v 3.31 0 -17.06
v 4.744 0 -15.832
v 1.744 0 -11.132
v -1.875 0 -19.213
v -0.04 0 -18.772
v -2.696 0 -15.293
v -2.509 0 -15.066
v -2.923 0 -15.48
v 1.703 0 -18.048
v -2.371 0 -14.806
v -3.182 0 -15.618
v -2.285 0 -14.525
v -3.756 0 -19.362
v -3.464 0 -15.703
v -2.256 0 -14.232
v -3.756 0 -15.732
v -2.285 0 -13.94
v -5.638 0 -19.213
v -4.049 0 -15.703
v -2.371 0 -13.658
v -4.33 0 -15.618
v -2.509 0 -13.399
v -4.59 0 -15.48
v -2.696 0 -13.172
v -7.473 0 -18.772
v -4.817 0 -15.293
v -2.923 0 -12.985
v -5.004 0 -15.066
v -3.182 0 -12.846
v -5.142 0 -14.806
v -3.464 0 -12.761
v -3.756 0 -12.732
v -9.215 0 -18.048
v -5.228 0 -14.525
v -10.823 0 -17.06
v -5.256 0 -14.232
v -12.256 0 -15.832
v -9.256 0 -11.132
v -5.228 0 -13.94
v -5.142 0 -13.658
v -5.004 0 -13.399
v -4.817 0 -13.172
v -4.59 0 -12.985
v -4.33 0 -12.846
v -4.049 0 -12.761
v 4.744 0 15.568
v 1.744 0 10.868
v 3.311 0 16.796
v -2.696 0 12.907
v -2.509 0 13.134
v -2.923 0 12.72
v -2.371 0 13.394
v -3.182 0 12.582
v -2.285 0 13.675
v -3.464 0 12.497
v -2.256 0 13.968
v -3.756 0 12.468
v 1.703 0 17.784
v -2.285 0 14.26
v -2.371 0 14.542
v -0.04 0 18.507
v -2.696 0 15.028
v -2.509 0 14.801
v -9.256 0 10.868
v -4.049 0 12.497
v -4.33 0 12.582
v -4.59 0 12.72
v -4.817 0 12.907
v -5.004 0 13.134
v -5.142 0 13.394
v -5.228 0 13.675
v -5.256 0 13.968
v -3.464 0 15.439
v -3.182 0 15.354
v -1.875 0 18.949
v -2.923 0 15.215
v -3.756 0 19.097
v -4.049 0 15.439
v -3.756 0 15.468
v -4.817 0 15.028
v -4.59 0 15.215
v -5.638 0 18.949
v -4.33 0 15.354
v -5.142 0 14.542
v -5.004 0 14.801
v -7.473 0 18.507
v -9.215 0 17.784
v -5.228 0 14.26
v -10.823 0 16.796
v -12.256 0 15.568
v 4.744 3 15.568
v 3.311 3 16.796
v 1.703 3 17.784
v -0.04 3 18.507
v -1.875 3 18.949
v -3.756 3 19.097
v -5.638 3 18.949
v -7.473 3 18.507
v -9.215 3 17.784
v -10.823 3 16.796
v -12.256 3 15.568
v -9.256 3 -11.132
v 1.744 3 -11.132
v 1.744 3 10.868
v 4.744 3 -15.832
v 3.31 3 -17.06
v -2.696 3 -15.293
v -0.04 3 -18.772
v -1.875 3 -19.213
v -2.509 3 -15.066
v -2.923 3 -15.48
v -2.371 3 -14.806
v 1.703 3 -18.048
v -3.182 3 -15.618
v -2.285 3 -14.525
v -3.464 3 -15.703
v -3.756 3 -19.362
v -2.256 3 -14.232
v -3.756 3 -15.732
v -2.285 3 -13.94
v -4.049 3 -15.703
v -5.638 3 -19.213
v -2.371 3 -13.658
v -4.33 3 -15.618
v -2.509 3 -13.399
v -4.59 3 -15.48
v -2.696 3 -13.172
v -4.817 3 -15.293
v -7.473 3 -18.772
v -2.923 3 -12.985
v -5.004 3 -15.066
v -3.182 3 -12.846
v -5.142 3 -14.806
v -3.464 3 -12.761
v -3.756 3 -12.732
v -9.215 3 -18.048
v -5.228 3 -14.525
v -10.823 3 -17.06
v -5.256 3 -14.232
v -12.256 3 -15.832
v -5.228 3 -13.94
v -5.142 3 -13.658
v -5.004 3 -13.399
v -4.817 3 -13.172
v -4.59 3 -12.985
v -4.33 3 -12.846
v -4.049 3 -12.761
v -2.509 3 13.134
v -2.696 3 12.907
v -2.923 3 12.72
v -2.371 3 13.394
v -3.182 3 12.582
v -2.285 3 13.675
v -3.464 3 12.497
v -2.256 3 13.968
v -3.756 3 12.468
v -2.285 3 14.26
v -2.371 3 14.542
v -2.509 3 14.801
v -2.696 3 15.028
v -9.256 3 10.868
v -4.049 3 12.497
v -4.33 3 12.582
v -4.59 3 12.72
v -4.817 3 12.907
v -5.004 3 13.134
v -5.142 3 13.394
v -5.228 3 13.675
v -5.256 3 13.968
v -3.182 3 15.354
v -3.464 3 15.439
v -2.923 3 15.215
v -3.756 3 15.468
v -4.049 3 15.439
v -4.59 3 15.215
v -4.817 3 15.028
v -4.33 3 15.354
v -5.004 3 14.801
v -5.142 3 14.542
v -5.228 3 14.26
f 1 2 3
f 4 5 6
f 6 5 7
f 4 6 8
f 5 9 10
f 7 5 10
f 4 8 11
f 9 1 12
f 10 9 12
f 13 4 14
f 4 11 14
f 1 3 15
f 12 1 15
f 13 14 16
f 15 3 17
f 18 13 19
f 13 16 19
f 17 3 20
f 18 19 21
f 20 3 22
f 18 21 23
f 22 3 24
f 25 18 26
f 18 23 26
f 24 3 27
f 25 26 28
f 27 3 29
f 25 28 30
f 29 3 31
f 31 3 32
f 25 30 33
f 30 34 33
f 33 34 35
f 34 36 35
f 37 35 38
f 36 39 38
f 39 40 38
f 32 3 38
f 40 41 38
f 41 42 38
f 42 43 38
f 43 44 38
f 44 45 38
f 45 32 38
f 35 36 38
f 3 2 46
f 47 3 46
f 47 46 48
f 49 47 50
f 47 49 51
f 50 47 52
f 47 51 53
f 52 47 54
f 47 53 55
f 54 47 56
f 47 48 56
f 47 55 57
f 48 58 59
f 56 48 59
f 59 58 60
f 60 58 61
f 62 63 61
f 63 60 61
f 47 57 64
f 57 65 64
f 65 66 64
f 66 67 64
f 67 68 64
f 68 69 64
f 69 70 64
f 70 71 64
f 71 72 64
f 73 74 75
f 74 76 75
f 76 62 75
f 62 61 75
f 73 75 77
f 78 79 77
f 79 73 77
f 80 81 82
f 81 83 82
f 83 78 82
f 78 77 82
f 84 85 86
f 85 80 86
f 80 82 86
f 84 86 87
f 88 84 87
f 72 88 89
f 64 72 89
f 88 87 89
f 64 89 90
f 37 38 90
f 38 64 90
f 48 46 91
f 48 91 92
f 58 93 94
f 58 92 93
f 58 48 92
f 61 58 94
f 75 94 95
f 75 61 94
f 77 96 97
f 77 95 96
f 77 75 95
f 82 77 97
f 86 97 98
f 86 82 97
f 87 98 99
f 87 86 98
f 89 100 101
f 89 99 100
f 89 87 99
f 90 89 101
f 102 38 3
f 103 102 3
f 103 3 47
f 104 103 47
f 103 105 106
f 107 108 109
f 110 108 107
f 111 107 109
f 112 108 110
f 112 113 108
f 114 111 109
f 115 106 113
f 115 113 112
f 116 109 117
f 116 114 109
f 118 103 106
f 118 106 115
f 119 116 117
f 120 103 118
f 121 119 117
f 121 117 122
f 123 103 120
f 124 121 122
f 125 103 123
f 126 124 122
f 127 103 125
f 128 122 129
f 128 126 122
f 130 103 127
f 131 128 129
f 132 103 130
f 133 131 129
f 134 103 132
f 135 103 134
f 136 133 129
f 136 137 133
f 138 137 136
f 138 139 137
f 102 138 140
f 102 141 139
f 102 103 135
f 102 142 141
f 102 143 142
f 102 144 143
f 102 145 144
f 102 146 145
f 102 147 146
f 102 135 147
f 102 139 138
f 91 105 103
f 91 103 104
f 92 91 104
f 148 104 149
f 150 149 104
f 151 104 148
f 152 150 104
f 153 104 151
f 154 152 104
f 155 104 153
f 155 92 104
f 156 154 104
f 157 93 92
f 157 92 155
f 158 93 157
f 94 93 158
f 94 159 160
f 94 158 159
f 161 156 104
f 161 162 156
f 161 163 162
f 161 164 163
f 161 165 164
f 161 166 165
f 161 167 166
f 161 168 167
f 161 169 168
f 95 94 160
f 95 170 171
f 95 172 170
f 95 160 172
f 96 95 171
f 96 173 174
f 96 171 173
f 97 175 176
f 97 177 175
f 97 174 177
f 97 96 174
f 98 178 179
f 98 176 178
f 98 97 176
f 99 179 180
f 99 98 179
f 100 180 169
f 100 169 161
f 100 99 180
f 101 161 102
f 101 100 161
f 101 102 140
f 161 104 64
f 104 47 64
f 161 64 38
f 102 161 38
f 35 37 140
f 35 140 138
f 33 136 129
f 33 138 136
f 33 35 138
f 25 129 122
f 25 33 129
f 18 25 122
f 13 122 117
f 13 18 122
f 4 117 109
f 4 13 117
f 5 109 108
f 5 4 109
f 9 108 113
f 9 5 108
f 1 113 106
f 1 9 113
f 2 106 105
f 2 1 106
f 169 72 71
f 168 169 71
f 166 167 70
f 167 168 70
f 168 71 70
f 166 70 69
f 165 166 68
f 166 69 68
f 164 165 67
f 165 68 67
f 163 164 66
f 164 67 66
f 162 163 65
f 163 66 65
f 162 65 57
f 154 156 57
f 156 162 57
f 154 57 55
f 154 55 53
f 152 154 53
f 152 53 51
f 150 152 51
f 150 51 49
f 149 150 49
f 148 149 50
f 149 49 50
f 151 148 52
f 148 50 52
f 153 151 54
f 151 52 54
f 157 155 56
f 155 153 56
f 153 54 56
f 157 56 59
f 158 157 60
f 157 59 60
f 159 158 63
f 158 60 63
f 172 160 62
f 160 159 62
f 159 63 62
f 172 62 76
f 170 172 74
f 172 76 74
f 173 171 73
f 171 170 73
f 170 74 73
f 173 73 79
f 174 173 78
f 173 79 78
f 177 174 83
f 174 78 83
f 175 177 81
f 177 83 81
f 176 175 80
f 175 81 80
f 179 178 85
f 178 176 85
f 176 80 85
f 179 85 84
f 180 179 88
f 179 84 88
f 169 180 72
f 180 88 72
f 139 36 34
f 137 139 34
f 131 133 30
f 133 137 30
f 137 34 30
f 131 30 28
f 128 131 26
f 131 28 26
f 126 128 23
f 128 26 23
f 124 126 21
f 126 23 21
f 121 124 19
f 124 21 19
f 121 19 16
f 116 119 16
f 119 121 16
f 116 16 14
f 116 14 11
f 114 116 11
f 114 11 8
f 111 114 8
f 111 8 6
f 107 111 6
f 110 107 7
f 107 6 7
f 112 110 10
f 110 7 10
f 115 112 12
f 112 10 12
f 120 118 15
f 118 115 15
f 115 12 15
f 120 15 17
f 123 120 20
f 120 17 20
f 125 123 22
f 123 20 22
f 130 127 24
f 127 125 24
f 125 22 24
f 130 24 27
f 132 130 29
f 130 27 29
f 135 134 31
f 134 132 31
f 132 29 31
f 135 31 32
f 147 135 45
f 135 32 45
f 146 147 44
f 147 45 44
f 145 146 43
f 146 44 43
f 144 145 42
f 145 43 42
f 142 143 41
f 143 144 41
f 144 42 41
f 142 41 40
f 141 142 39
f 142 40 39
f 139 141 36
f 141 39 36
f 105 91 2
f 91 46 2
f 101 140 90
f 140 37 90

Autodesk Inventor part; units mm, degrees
ref_plane "YZ Plane" through (0, 0, 0) normal (1, 0, 0) x (0, 1, 0)
ref_plane "XZ Plane" through (0, 0, 0) normal (0, 1, 0) x (-1, 0, 0)
ref_plane "XY Plane" through (0, 0, 0) normal (0, 0, 1) x (1, 0, 0)
sketch "Sketch1" plane through (0, 0, 0) normal (0, 1, 0) x (-1, 0, 0)
  line L0 (9.2564, 10.8677) -> (9.2564, -11.1323)
  line L1 (9.2564, -11.1323) -> (-1.7436, -11.1323)
  line L2 (-1.7436, -11.1323) -> (-1.7436, 10.8677)
  line L3 (-1.7436, 10.8677) -> (9.2564, 10.8677)
  line L4 (12.2564, -15.8323) -> (12.2564, 15.5677)
  line L5 (-4.7436, 15.5677) -> (-4.7436, -15.8323)
  arc A0 (12.2564, 15.5677) -> (-4.7436, 15.5677) centre (3.7564, 7.0972) ccw
  arc A1 (-4.7436, -15.8323) -> (12.2564, -15.8323) centre (3.7564, -7.3617) ccw
  circle A2 centre (3.7564, 13.9677) radius 1.5
  circle A3 centre (3.7564, -14.2323) radius 1.5
  point P0 (0, 0)
  dimension "d0" = 22
extrude "Extrusion1" add sketch "Sketch1" along normal blind 3
properties part number "servo Holder" material "ABS Plastic"
